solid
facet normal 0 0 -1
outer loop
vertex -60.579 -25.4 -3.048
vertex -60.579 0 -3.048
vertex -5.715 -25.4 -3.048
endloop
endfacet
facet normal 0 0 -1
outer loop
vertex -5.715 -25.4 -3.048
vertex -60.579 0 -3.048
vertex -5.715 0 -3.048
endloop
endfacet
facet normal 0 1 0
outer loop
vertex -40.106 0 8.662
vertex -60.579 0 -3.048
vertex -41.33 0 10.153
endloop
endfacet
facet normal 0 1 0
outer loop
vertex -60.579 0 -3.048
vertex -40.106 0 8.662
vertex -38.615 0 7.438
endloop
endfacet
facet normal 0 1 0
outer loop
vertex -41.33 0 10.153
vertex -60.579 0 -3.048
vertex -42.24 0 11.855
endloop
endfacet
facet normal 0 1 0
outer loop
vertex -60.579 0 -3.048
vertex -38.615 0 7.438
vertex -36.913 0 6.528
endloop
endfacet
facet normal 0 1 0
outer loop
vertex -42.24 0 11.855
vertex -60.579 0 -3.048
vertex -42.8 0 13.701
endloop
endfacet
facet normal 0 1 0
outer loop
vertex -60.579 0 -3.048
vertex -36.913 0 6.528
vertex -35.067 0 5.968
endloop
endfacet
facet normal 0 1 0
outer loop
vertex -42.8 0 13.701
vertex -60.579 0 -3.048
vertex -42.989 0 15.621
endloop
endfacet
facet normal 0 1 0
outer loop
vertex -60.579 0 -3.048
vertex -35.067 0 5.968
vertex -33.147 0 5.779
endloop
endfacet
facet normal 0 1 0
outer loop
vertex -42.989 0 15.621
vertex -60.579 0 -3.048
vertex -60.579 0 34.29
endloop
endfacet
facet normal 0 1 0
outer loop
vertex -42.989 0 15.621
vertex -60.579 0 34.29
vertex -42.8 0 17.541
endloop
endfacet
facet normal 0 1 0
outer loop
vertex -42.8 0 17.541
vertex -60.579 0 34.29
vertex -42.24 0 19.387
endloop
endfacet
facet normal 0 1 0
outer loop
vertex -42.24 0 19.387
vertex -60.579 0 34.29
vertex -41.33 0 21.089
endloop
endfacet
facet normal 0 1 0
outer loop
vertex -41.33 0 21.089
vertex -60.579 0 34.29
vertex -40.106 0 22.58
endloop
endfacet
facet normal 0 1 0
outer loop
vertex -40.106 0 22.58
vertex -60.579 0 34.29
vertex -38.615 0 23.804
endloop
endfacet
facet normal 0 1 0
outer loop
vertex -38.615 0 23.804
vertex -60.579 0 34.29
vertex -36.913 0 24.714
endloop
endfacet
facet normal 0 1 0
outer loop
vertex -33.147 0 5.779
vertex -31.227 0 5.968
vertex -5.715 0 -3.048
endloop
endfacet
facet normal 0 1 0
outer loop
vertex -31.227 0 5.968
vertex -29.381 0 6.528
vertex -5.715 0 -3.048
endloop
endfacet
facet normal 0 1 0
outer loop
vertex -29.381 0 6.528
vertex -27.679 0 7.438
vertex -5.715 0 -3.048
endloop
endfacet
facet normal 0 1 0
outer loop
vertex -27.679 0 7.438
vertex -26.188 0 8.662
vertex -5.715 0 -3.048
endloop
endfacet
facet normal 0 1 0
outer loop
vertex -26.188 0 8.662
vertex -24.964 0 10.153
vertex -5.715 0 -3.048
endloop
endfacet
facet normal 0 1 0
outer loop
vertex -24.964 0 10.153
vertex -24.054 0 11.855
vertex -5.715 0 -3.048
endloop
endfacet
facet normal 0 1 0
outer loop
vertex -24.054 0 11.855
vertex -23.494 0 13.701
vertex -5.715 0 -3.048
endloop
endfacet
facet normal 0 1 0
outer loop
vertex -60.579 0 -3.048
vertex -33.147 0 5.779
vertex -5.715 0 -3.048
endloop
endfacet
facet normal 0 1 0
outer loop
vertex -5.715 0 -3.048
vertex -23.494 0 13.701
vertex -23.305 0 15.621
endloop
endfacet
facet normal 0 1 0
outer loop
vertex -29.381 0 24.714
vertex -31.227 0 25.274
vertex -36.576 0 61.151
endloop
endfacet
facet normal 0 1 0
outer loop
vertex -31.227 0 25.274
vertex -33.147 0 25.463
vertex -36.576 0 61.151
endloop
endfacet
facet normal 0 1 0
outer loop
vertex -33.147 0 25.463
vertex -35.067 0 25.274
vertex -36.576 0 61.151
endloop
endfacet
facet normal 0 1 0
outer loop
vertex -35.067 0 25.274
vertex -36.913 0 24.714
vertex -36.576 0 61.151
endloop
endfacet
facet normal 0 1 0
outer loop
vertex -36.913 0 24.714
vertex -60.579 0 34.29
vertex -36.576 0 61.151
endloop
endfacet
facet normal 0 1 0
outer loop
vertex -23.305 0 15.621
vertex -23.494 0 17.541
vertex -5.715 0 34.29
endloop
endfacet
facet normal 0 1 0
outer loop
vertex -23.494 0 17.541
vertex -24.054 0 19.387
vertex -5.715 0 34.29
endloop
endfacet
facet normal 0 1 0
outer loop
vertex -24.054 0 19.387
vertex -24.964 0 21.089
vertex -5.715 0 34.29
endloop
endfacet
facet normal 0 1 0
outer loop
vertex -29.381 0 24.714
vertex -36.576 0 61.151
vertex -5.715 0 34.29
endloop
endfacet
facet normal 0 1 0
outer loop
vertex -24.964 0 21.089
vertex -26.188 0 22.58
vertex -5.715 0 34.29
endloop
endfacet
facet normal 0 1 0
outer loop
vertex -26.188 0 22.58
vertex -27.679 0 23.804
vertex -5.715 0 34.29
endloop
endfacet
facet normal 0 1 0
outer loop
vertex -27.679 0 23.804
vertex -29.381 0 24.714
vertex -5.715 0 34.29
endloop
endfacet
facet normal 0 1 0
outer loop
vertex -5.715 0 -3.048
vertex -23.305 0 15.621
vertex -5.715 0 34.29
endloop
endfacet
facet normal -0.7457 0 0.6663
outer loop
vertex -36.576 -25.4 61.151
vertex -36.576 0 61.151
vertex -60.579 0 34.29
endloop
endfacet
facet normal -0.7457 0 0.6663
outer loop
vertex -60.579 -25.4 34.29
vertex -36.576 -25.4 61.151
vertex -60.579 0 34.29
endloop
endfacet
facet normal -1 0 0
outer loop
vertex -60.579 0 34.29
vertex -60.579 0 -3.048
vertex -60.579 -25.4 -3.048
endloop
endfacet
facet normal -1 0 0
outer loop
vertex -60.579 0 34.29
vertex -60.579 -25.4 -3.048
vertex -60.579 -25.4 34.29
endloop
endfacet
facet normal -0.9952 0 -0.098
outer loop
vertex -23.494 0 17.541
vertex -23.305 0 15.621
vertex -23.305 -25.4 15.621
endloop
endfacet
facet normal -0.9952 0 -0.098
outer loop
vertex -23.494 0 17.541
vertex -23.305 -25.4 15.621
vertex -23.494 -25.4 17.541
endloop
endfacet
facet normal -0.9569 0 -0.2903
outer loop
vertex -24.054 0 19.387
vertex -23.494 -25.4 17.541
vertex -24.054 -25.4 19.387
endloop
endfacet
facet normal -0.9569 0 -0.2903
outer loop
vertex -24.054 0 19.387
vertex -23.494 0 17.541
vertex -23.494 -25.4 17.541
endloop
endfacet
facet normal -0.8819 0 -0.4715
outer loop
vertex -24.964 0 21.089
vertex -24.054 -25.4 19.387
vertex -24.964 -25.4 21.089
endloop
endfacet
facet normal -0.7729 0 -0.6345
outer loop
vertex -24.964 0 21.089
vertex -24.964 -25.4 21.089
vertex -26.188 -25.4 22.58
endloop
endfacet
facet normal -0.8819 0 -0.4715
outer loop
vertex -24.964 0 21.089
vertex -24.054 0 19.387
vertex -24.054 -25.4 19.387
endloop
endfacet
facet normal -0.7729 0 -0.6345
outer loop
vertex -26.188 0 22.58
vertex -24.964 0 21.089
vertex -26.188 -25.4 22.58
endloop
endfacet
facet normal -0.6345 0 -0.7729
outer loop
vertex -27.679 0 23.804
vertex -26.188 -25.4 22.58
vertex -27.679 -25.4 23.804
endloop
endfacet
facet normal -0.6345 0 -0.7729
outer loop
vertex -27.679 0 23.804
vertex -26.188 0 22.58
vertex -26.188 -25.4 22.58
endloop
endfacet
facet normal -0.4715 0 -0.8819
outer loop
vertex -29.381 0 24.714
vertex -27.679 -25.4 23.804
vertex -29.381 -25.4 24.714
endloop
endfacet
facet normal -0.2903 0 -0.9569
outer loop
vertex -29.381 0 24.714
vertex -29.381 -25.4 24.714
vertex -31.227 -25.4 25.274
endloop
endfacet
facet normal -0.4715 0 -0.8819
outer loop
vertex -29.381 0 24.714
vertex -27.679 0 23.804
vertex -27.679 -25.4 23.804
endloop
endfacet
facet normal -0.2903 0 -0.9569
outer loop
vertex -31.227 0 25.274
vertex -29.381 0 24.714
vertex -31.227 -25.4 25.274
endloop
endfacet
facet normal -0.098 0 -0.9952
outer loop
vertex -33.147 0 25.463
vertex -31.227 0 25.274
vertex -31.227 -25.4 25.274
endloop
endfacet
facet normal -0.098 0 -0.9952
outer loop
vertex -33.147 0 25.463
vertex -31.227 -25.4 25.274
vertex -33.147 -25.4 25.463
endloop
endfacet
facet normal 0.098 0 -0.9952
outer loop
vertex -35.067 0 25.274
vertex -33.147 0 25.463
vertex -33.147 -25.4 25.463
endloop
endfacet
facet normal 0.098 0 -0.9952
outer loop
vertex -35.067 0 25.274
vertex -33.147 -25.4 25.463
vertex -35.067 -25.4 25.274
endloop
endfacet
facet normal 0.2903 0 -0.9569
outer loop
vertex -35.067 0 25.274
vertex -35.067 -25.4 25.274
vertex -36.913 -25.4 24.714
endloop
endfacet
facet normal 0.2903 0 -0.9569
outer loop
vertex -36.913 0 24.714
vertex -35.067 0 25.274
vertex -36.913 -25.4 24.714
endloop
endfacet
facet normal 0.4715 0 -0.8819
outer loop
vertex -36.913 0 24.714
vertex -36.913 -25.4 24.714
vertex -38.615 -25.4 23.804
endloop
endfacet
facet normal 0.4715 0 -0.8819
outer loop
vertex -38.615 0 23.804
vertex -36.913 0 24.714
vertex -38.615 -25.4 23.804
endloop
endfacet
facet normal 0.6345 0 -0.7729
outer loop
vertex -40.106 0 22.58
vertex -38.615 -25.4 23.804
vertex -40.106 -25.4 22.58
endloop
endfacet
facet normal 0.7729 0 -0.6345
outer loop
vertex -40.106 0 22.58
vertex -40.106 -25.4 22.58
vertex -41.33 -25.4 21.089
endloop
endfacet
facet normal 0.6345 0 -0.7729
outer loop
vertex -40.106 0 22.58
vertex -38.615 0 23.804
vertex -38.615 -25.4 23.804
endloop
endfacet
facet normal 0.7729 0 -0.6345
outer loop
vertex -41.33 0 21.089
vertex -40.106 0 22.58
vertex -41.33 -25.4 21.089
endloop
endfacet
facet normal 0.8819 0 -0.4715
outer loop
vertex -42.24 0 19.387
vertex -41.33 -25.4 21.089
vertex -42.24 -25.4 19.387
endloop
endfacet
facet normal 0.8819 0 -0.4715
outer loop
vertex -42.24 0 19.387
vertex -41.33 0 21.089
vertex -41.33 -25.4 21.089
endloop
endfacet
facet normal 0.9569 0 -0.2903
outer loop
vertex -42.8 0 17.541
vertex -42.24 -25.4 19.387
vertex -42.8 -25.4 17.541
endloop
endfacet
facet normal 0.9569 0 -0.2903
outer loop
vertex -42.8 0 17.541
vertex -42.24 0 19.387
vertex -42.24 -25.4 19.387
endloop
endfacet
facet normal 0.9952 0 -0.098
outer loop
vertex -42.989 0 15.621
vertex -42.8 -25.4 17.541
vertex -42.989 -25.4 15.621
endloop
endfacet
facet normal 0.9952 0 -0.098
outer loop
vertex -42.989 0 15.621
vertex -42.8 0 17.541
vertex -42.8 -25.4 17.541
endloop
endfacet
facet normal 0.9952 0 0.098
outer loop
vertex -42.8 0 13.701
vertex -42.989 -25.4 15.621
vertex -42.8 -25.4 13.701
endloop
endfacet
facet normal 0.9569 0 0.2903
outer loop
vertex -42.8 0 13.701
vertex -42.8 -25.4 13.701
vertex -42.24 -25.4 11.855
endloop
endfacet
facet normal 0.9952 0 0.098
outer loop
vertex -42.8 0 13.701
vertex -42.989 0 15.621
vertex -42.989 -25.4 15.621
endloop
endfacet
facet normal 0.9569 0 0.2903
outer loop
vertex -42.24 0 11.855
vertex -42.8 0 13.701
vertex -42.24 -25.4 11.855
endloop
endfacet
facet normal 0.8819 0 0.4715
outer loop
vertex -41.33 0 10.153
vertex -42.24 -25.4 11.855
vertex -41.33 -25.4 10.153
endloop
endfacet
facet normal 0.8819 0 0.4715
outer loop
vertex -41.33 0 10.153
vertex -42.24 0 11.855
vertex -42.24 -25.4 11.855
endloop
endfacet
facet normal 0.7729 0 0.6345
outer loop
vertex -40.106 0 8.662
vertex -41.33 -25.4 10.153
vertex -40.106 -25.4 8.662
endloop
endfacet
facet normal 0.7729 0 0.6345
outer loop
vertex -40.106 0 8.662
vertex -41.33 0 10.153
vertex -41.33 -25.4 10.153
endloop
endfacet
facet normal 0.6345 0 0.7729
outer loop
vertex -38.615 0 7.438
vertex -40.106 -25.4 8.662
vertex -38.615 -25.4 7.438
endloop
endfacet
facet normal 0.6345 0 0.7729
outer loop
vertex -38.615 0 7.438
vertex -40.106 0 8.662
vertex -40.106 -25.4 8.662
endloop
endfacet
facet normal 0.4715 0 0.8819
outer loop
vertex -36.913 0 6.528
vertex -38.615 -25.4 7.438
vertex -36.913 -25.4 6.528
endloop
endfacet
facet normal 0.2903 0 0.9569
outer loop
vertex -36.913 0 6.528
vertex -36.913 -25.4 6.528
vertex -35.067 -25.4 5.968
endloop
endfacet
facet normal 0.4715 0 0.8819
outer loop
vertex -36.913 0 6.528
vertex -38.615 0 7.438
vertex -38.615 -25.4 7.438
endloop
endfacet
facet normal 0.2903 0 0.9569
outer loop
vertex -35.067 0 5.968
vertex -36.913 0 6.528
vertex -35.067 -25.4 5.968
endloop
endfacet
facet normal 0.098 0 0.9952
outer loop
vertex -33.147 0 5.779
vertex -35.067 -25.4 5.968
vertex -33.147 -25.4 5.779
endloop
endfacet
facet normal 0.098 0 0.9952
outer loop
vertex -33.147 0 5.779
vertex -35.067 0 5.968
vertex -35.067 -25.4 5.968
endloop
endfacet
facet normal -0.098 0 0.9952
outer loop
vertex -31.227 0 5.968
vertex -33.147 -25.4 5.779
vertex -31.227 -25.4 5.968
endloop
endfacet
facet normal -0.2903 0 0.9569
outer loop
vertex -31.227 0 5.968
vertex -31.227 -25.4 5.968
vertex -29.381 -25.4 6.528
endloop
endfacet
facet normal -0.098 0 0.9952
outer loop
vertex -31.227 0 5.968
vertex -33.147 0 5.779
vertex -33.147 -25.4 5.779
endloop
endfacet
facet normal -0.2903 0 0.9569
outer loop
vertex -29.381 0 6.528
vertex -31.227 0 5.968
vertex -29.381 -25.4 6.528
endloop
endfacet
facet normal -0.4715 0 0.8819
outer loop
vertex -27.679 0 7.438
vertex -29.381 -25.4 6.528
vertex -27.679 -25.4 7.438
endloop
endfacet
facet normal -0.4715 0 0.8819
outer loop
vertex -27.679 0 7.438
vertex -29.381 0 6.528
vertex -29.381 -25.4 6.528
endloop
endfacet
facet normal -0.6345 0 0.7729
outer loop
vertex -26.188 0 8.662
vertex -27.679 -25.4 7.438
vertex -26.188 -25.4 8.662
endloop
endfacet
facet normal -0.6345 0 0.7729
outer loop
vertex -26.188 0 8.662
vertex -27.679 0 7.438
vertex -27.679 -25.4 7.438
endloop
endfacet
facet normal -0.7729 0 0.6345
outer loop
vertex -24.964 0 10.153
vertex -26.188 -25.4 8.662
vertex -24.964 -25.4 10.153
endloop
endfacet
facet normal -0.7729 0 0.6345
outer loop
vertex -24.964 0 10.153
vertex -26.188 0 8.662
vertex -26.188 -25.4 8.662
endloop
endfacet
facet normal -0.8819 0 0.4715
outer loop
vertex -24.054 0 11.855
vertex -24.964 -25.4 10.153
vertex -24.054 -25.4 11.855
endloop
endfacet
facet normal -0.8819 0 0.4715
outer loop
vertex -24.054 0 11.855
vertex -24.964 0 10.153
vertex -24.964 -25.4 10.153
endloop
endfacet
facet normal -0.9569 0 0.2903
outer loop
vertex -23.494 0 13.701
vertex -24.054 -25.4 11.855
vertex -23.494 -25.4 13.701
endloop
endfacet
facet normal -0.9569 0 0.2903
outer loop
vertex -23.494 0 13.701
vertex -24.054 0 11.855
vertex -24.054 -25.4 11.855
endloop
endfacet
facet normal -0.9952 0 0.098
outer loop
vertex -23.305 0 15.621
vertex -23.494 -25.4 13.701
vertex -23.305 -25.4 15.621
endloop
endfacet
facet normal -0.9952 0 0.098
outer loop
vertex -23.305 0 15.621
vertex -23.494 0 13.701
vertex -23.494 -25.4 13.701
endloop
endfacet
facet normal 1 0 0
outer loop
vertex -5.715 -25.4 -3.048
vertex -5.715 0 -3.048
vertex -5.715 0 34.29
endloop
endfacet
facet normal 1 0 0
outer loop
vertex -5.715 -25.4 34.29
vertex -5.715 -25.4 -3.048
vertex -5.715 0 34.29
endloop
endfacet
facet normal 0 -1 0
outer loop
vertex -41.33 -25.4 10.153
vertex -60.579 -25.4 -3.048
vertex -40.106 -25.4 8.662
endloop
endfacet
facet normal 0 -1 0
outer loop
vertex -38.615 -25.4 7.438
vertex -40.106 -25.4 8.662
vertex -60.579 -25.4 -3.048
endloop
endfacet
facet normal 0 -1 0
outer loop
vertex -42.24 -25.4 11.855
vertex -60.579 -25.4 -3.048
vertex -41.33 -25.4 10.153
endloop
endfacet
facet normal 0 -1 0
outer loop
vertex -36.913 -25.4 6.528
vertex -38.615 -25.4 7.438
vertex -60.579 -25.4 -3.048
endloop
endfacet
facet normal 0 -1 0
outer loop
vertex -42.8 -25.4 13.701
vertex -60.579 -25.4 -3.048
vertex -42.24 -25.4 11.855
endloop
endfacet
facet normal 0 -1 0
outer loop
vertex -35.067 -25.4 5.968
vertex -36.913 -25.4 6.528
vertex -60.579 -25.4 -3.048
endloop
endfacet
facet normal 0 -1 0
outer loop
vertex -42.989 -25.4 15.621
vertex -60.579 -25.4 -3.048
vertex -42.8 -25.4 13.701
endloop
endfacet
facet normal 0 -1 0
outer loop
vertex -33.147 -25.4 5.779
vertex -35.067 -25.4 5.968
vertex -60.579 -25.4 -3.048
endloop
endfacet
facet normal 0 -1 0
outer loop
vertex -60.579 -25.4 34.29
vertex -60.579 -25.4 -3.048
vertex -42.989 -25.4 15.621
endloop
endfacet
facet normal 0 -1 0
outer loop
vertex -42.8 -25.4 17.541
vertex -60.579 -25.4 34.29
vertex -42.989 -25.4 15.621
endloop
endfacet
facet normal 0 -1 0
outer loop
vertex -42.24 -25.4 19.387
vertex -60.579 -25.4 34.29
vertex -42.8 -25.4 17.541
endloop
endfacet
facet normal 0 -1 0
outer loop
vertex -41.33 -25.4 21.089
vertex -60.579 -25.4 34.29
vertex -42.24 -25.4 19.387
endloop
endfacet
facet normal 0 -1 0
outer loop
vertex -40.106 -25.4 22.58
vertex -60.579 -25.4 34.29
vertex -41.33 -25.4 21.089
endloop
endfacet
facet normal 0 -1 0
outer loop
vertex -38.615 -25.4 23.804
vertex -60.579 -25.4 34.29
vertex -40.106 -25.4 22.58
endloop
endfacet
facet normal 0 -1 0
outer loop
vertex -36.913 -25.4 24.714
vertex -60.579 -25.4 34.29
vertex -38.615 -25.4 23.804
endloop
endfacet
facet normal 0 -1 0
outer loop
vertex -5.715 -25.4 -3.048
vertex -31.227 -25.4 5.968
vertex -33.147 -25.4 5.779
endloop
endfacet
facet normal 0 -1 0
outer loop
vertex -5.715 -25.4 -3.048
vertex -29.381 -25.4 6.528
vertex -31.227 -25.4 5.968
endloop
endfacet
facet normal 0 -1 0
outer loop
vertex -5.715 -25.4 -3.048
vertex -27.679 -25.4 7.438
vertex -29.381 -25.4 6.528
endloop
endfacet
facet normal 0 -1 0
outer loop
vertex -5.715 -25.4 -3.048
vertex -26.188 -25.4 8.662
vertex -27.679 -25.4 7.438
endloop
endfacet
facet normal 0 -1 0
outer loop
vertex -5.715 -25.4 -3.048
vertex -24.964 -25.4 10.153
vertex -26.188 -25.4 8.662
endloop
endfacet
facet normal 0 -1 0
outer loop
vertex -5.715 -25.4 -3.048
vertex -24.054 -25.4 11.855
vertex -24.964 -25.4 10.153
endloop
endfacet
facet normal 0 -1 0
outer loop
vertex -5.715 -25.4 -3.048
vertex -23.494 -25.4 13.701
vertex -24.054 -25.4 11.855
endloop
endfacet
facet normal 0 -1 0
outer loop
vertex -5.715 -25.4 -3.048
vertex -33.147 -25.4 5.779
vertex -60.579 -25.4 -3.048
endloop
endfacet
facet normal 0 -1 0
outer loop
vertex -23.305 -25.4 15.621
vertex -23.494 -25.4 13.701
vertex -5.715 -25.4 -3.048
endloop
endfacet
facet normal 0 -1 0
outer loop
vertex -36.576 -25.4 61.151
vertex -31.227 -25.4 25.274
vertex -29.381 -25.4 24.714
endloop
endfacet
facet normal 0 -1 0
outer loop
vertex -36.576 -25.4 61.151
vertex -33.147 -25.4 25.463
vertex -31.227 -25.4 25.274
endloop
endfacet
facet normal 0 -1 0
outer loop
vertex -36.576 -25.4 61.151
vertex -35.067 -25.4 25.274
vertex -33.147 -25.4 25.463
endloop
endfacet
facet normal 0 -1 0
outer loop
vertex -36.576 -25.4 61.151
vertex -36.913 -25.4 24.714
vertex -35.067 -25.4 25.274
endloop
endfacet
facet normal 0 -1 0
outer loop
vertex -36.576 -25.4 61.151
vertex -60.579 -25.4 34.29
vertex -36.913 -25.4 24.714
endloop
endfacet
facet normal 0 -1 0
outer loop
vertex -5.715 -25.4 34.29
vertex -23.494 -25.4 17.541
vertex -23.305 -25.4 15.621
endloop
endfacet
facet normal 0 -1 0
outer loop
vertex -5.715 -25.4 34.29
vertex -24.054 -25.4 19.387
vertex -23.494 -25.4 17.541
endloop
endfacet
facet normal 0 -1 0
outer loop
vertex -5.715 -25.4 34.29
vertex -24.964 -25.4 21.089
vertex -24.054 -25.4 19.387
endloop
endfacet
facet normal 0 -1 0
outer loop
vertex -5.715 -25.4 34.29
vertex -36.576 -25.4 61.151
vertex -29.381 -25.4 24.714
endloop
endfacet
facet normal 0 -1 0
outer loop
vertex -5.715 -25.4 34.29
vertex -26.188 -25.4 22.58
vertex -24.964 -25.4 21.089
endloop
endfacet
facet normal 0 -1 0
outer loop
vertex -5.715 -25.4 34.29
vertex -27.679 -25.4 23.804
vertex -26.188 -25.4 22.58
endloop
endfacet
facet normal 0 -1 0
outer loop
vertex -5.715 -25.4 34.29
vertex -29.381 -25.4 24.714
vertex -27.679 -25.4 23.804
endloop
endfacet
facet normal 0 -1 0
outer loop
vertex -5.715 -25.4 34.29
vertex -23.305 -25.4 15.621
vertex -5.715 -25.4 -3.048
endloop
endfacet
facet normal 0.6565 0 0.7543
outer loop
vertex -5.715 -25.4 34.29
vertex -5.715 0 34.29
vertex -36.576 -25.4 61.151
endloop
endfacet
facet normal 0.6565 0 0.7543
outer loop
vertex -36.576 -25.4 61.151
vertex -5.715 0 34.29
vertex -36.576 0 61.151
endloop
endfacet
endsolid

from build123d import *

# Parameters (mm, degrees)
F0_W     = 54.863999
F0_H     = 37.338002
F0_R     = 9.841681
F1_DEPTH = 25.4


with BuildPart() as f1:
    # F0 (on Front) → F1 (new body)
    with BuildSketch(Plane.XZ):
        Polygon((-60.578999, 34.290002), (-5.715, 34.290002), (-36.575999, 61.150502), align=None)
        with Locations((-33.146999, 15.621001)):
            Rectangle(F0_W, F0_H)
        with Locations((-33.147, 15.621001)):
            Circle(F0_R, mode=Mode.SUBTRACT)
    extrude(amount=F1_DEPTH)


solid = f1.part
